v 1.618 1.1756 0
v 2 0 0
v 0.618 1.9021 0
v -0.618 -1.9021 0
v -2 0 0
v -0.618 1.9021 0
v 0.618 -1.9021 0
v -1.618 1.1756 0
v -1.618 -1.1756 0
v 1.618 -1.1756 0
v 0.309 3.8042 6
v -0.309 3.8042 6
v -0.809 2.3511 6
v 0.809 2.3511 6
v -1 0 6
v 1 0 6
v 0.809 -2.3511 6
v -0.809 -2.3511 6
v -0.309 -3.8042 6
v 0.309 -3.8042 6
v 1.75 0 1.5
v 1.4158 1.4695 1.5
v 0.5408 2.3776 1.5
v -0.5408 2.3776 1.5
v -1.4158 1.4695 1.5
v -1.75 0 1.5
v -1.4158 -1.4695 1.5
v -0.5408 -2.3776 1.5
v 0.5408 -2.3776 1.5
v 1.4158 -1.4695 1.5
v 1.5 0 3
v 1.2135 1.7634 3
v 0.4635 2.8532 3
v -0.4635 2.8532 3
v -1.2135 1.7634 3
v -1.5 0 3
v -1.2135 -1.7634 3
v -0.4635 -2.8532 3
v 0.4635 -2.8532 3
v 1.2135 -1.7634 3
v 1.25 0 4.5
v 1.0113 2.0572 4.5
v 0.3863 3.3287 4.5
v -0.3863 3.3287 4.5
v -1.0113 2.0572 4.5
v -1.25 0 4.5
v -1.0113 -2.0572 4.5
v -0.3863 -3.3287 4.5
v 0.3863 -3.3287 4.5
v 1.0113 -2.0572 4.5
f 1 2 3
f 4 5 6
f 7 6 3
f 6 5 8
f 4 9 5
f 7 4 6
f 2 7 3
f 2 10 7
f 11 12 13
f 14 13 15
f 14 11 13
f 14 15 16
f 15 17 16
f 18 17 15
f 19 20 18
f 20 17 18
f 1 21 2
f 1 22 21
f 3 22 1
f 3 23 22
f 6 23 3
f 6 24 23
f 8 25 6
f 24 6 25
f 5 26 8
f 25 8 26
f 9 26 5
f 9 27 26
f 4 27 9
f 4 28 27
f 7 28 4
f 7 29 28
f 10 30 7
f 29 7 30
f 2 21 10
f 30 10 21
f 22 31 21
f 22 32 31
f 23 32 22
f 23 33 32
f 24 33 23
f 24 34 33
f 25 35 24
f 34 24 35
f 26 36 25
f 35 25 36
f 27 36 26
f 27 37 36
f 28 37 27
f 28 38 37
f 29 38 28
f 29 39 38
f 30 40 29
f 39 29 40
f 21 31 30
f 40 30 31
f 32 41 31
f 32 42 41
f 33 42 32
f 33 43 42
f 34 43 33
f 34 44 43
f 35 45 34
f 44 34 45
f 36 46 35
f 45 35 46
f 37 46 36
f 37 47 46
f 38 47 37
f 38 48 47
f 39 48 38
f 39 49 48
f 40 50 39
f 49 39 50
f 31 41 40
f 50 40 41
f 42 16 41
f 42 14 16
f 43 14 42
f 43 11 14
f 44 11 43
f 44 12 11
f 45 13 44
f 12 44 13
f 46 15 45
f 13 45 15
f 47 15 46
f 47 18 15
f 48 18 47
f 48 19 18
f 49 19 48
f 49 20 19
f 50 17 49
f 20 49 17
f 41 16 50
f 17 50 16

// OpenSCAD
// scale with a vector
linear_extrude(height = 6, scale = [0.5, 2]) circle(2, $fn = 10);
